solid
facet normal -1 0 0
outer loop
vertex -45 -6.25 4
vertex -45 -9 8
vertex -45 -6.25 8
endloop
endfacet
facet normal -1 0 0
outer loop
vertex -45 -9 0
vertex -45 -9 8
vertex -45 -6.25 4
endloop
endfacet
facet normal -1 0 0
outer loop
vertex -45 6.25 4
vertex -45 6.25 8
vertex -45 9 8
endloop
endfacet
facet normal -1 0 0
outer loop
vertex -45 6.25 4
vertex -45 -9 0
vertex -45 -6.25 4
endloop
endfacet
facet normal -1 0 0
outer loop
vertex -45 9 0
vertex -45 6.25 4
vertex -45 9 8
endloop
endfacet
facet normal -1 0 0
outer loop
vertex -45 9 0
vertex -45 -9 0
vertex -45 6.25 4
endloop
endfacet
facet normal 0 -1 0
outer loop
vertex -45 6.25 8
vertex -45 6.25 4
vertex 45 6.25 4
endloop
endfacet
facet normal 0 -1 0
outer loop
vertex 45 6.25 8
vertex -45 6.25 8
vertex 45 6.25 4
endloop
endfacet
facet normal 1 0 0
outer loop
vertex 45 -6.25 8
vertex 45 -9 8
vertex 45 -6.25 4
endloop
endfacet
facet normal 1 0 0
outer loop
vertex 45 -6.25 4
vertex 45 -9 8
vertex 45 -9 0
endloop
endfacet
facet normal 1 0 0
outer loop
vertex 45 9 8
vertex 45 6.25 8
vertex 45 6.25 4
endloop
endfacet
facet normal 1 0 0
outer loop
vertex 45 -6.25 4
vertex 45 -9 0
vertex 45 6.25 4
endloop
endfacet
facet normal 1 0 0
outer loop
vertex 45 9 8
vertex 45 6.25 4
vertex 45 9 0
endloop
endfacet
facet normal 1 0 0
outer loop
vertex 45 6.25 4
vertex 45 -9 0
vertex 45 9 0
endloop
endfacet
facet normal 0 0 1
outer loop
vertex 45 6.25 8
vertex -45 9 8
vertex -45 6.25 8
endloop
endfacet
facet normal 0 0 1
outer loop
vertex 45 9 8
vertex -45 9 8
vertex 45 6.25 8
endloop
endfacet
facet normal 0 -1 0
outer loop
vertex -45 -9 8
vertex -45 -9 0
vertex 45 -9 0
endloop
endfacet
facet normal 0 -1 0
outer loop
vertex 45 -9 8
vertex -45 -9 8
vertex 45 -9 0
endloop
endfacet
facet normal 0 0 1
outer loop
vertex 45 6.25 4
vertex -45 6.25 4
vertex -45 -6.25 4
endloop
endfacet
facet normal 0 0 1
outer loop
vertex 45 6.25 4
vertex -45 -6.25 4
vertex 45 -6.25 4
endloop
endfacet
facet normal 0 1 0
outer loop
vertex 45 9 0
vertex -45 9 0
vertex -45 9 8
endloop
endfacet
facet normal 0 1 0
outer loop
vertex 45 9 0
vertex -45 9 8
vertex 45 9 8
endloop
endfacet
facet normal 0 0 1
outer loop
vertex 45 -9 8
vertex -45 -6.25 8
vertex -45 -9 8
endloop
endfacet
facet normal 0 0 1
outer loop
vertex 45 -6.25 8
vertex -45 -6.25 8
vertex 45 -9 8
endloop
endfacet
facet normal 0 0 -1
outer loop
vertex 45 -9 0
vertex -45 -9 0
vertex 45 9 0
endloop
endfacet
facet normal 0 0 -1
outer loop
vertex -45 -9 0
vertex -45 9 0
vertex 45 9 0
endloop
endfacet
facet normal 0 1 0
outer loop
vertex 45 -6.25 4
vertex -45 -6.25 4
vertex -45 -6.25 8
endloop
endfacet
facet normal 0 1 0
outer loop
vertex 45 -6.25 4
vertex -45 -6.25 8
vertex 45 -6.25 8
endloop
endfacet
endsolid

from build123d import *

# Parameters (mm, degrees)
F0_W     = 90
F0_H     = 2.75
F1_DEPTH = 8
F0_H_2   = 12.5
F2_DEPTH = 4


with BuildPart() as f1:
    # F0 (on Top) → F1 (new body)
    with BuildSketch(Plane.XY):
        with Locations((0, 7.625)):
            Rectangle(F0_W, F0_H)
    extrude(amount=F1_DEPTH)



with BuildPart() as f1b:
    # F0 (on Top) → F1, piece 2 (new body)
    with BuildSketch(Plane.XY):
        with Locations((0, -7.625)):
            Rectangle(F0_W, F0_H)
    extrude(amount=F1_DEPTH)


with BuildPart() as f1_1:
    add(f1.part)

    add(f1b.part)  # F2 merges F1b
    # F0 (on Top) → F2 (join)
    with BuildSketch(Plane.XY):
        Rectangle(F0_W, F0_H_2)
    extrude(amount=F2_DEPTH)


solid = f1_1.part
